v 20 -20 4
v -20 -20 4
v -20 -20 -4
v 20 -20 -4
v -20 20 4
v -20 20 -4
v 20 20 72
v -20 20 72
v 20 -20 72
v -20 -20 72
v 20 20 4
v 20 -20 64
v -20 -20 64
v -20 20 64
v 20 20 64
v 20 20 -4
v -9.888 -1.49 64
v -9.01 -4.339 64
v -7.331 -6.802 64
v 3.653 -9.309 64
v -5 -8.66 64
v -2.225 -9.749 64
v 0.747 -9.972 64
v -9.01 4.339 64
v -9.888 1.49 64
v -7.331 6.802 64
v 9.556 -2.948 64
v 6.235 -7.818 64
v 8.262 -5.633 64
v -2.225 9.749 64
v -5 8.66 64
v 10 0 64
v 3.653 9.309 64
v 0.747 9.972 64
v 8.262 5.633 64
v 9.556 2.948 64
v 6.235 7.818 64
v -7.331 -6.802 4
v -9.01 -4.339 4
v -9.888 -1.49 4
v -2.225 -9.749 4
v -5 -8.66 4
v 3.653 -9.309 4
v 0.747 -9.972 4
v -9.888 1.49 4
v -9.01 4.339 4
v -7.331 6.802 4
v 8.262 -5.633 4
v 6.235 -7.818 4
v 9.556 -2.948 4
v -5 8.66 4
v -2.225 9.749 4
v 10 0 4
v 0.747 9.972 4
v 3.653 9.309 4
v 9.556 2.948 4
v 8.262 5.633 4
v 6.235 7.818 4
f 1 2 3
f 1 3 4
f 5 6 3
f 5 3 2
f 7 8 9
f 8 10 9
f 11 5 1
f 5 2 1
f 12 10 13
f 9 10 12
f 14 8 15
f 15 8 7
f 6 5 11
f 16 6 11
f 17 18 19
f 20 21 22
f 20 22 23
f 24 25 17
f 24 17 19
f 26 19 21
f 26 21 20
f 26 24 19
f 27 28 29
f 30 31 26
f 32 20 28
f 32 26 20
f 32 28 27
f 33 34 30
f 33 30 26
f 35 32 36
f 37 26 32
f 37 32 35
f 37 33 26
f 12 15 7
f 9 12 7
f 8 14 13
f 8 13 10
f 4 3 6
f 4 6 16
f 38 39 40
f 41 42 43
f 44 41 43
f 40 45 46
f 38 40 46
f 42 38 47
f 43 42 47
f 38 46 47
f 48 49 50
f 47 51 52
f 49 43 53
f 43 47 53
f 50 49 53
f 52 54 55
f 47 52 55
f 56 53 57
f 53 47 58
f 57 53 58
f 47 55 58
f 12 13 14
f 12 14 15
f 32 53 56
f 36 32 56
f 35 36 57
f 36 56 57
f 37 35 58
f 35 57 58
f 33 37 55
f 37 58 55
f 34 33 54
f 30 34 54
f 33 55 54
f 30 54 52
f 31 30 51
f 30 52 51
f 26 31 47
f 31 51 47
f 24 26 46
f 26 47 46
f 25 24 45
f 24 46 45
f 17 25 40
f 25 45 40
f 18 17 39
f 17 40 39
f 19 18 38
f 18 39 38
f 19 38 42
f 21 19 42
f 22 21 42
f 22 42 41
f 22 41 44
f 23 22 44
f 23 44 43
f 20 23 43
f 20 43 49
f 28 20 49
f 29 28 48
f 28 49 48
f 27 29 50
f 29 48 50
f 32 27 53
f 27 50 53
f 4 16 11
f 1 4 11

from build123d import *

# Parameters (mm, degrees)
F0_W     = 40
F0_H     = 8
F1_DEPTH = 20
F2_R     = 10
F3_DEPTH = 60


with BuildPart() as f1:
    # F0 (on Front) → F1 (new body, symmetric)
    with BuildSketch(Plane.XZ):
        Rectangle(F0_W, F0_H)
    extrude(amount=F1_DEPTH, both=True)


with BuildPart() as f1b:
    # F0 (on Front) → F1, piece 2 (new body, symmetric)
    with BuildSketch(Plane.XZ):
        with Locations((0, 68)):
            Rectangle(F0_W, F0_H)
    extrude(amount=F1_DEPTH, both=True)


with BuildPart() as f3:
    # F2 (on face) → F3 (new body, through all)
    with BuildSketch(Plane.XY.offset(4)):
        Circle(F2_R)
    extrude(amount=F3_DEPTH)


solid = Compound([f1.part, f1b.part, f3.part])
